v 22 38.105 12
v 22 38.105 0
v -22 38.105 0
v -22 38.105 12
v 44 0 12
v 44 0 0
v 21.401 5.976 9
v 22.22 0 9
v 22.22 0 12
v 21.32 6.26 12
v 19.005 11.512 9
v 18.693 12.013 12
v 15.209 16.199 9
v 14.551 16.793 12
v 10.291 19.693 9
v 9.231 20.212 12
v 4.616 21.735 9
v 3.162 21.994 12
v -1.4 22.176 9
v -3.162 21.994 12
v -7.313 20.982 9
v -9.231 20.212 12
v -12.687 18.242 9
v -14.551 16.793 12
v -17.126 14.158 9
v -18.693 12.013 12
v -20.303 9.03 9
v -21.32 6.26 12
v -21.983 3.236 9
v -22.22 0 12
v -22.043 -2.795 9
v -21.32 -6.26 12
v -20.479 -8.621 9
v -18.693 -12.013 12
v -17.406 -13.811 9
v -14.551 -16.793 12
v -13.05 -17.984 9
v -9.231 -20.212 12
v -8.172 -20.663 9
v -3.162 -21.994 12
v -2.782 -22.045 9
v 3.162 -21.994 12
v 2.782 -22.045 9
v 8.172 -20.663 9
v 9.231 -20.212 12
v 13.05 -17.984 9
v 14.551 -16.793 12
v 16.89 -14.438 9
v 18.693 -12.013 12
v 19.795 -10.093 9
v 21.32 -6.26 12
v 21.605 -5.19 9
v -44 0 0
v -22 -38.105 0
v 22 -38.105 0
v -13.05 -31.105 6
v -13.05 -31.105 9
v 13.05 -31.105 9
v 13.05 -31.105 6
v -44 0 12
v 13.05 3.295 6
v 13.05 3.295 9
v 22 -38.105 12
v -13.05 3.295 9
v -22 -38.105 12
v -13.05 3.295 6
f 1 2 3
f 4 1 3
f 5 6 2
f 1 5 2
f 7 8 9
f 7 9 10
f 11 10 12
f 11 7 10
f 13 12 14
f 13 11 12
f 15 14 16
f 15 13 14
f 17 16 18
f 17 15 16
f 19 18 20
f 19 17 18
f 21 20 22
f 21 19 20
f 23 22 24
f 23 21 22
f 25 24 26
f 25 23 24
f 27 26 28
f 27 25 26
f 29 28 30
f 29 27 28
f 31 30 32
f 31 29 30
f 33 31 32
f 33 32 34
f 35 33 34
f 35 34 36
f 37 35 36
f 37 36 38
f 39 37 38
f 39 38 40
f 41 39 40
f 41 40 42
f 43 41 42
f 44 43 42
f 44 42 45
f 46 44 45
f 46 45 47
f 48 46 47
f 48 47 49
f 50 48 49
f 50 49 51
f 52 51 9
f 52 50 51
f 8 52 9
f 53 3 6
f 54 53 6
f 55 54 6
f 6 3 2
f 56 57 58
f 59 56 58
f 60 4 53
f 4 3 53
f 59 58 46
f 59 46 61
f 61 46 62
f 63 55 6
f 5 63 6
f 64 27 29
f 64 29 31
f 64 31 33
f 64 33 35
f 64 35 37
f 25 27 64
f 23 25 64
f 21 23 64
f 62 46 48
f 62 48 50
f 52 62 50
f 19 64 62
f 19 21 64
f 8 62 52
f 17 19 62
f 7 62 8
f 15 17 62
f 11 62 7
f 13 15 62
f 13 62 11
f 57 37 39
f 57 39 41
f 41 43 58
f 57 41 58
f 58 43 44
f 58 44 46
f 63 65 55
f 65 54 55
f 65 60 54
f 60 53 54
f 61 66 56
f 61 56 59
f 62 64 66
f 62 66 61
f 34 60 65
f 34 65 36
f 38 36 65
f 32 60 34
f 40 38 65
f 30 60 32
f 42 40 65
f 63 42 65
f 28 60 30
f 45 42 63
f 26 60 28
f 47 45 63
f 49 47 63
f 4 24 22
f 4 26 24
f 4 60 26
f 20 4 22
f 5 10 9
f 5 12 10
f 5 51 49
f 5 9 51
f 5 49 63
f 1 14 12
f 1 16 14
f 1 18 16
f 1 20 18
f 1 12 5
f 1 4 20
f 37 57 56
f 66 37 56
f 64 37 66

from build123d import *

# Parameters (mm, degrees)
PAD_DEPTH    = 9
SKETCH001_W  = 26.1
SKETCH001_H  = 34.4
POCKET_DEPTH = 3
SKETCH002_R  = 22.22
PAD001_DEPTH = 3


with BuildPart() as part:
    # Sketch → Pad (new body)
    with BuildSketch(Plane.XY):
        Polygon((44, 0), (22, 38.105118), (-22, 38.105118), (-44, 0), (-22, -38.105118), (22, -38.105118), align=None)
    extrude(amount=PAD_DEPTH)

    # Sketch001 (on Face8 of Pad) → Pocket (cut)
    with BuildSketch(Plane.XY.offset(9)):
        with Locations((0, -13.905118)):
            Rectangle(SKETCH001_W, SKETCH001_H)
    extrude(amount=-POCKET_DEPTH, mode=Mode.SUBTRACT)

    # Sketch002 (on Face5 of Pocket) → Pad001 (join)
    with BuildSketch(Plane.XY.offset(9)):
        Polygon((22, 38.105118), (-22, 38.105118), (-44, 0), (-22, -38.105118), (22, -38.105118), (44, 0), align=None)
        Circle(SKETCH002_R, mode=Mode.SUBTRACT)
    extrude(amount=PAD001_DEPTH)


solid = part.part
